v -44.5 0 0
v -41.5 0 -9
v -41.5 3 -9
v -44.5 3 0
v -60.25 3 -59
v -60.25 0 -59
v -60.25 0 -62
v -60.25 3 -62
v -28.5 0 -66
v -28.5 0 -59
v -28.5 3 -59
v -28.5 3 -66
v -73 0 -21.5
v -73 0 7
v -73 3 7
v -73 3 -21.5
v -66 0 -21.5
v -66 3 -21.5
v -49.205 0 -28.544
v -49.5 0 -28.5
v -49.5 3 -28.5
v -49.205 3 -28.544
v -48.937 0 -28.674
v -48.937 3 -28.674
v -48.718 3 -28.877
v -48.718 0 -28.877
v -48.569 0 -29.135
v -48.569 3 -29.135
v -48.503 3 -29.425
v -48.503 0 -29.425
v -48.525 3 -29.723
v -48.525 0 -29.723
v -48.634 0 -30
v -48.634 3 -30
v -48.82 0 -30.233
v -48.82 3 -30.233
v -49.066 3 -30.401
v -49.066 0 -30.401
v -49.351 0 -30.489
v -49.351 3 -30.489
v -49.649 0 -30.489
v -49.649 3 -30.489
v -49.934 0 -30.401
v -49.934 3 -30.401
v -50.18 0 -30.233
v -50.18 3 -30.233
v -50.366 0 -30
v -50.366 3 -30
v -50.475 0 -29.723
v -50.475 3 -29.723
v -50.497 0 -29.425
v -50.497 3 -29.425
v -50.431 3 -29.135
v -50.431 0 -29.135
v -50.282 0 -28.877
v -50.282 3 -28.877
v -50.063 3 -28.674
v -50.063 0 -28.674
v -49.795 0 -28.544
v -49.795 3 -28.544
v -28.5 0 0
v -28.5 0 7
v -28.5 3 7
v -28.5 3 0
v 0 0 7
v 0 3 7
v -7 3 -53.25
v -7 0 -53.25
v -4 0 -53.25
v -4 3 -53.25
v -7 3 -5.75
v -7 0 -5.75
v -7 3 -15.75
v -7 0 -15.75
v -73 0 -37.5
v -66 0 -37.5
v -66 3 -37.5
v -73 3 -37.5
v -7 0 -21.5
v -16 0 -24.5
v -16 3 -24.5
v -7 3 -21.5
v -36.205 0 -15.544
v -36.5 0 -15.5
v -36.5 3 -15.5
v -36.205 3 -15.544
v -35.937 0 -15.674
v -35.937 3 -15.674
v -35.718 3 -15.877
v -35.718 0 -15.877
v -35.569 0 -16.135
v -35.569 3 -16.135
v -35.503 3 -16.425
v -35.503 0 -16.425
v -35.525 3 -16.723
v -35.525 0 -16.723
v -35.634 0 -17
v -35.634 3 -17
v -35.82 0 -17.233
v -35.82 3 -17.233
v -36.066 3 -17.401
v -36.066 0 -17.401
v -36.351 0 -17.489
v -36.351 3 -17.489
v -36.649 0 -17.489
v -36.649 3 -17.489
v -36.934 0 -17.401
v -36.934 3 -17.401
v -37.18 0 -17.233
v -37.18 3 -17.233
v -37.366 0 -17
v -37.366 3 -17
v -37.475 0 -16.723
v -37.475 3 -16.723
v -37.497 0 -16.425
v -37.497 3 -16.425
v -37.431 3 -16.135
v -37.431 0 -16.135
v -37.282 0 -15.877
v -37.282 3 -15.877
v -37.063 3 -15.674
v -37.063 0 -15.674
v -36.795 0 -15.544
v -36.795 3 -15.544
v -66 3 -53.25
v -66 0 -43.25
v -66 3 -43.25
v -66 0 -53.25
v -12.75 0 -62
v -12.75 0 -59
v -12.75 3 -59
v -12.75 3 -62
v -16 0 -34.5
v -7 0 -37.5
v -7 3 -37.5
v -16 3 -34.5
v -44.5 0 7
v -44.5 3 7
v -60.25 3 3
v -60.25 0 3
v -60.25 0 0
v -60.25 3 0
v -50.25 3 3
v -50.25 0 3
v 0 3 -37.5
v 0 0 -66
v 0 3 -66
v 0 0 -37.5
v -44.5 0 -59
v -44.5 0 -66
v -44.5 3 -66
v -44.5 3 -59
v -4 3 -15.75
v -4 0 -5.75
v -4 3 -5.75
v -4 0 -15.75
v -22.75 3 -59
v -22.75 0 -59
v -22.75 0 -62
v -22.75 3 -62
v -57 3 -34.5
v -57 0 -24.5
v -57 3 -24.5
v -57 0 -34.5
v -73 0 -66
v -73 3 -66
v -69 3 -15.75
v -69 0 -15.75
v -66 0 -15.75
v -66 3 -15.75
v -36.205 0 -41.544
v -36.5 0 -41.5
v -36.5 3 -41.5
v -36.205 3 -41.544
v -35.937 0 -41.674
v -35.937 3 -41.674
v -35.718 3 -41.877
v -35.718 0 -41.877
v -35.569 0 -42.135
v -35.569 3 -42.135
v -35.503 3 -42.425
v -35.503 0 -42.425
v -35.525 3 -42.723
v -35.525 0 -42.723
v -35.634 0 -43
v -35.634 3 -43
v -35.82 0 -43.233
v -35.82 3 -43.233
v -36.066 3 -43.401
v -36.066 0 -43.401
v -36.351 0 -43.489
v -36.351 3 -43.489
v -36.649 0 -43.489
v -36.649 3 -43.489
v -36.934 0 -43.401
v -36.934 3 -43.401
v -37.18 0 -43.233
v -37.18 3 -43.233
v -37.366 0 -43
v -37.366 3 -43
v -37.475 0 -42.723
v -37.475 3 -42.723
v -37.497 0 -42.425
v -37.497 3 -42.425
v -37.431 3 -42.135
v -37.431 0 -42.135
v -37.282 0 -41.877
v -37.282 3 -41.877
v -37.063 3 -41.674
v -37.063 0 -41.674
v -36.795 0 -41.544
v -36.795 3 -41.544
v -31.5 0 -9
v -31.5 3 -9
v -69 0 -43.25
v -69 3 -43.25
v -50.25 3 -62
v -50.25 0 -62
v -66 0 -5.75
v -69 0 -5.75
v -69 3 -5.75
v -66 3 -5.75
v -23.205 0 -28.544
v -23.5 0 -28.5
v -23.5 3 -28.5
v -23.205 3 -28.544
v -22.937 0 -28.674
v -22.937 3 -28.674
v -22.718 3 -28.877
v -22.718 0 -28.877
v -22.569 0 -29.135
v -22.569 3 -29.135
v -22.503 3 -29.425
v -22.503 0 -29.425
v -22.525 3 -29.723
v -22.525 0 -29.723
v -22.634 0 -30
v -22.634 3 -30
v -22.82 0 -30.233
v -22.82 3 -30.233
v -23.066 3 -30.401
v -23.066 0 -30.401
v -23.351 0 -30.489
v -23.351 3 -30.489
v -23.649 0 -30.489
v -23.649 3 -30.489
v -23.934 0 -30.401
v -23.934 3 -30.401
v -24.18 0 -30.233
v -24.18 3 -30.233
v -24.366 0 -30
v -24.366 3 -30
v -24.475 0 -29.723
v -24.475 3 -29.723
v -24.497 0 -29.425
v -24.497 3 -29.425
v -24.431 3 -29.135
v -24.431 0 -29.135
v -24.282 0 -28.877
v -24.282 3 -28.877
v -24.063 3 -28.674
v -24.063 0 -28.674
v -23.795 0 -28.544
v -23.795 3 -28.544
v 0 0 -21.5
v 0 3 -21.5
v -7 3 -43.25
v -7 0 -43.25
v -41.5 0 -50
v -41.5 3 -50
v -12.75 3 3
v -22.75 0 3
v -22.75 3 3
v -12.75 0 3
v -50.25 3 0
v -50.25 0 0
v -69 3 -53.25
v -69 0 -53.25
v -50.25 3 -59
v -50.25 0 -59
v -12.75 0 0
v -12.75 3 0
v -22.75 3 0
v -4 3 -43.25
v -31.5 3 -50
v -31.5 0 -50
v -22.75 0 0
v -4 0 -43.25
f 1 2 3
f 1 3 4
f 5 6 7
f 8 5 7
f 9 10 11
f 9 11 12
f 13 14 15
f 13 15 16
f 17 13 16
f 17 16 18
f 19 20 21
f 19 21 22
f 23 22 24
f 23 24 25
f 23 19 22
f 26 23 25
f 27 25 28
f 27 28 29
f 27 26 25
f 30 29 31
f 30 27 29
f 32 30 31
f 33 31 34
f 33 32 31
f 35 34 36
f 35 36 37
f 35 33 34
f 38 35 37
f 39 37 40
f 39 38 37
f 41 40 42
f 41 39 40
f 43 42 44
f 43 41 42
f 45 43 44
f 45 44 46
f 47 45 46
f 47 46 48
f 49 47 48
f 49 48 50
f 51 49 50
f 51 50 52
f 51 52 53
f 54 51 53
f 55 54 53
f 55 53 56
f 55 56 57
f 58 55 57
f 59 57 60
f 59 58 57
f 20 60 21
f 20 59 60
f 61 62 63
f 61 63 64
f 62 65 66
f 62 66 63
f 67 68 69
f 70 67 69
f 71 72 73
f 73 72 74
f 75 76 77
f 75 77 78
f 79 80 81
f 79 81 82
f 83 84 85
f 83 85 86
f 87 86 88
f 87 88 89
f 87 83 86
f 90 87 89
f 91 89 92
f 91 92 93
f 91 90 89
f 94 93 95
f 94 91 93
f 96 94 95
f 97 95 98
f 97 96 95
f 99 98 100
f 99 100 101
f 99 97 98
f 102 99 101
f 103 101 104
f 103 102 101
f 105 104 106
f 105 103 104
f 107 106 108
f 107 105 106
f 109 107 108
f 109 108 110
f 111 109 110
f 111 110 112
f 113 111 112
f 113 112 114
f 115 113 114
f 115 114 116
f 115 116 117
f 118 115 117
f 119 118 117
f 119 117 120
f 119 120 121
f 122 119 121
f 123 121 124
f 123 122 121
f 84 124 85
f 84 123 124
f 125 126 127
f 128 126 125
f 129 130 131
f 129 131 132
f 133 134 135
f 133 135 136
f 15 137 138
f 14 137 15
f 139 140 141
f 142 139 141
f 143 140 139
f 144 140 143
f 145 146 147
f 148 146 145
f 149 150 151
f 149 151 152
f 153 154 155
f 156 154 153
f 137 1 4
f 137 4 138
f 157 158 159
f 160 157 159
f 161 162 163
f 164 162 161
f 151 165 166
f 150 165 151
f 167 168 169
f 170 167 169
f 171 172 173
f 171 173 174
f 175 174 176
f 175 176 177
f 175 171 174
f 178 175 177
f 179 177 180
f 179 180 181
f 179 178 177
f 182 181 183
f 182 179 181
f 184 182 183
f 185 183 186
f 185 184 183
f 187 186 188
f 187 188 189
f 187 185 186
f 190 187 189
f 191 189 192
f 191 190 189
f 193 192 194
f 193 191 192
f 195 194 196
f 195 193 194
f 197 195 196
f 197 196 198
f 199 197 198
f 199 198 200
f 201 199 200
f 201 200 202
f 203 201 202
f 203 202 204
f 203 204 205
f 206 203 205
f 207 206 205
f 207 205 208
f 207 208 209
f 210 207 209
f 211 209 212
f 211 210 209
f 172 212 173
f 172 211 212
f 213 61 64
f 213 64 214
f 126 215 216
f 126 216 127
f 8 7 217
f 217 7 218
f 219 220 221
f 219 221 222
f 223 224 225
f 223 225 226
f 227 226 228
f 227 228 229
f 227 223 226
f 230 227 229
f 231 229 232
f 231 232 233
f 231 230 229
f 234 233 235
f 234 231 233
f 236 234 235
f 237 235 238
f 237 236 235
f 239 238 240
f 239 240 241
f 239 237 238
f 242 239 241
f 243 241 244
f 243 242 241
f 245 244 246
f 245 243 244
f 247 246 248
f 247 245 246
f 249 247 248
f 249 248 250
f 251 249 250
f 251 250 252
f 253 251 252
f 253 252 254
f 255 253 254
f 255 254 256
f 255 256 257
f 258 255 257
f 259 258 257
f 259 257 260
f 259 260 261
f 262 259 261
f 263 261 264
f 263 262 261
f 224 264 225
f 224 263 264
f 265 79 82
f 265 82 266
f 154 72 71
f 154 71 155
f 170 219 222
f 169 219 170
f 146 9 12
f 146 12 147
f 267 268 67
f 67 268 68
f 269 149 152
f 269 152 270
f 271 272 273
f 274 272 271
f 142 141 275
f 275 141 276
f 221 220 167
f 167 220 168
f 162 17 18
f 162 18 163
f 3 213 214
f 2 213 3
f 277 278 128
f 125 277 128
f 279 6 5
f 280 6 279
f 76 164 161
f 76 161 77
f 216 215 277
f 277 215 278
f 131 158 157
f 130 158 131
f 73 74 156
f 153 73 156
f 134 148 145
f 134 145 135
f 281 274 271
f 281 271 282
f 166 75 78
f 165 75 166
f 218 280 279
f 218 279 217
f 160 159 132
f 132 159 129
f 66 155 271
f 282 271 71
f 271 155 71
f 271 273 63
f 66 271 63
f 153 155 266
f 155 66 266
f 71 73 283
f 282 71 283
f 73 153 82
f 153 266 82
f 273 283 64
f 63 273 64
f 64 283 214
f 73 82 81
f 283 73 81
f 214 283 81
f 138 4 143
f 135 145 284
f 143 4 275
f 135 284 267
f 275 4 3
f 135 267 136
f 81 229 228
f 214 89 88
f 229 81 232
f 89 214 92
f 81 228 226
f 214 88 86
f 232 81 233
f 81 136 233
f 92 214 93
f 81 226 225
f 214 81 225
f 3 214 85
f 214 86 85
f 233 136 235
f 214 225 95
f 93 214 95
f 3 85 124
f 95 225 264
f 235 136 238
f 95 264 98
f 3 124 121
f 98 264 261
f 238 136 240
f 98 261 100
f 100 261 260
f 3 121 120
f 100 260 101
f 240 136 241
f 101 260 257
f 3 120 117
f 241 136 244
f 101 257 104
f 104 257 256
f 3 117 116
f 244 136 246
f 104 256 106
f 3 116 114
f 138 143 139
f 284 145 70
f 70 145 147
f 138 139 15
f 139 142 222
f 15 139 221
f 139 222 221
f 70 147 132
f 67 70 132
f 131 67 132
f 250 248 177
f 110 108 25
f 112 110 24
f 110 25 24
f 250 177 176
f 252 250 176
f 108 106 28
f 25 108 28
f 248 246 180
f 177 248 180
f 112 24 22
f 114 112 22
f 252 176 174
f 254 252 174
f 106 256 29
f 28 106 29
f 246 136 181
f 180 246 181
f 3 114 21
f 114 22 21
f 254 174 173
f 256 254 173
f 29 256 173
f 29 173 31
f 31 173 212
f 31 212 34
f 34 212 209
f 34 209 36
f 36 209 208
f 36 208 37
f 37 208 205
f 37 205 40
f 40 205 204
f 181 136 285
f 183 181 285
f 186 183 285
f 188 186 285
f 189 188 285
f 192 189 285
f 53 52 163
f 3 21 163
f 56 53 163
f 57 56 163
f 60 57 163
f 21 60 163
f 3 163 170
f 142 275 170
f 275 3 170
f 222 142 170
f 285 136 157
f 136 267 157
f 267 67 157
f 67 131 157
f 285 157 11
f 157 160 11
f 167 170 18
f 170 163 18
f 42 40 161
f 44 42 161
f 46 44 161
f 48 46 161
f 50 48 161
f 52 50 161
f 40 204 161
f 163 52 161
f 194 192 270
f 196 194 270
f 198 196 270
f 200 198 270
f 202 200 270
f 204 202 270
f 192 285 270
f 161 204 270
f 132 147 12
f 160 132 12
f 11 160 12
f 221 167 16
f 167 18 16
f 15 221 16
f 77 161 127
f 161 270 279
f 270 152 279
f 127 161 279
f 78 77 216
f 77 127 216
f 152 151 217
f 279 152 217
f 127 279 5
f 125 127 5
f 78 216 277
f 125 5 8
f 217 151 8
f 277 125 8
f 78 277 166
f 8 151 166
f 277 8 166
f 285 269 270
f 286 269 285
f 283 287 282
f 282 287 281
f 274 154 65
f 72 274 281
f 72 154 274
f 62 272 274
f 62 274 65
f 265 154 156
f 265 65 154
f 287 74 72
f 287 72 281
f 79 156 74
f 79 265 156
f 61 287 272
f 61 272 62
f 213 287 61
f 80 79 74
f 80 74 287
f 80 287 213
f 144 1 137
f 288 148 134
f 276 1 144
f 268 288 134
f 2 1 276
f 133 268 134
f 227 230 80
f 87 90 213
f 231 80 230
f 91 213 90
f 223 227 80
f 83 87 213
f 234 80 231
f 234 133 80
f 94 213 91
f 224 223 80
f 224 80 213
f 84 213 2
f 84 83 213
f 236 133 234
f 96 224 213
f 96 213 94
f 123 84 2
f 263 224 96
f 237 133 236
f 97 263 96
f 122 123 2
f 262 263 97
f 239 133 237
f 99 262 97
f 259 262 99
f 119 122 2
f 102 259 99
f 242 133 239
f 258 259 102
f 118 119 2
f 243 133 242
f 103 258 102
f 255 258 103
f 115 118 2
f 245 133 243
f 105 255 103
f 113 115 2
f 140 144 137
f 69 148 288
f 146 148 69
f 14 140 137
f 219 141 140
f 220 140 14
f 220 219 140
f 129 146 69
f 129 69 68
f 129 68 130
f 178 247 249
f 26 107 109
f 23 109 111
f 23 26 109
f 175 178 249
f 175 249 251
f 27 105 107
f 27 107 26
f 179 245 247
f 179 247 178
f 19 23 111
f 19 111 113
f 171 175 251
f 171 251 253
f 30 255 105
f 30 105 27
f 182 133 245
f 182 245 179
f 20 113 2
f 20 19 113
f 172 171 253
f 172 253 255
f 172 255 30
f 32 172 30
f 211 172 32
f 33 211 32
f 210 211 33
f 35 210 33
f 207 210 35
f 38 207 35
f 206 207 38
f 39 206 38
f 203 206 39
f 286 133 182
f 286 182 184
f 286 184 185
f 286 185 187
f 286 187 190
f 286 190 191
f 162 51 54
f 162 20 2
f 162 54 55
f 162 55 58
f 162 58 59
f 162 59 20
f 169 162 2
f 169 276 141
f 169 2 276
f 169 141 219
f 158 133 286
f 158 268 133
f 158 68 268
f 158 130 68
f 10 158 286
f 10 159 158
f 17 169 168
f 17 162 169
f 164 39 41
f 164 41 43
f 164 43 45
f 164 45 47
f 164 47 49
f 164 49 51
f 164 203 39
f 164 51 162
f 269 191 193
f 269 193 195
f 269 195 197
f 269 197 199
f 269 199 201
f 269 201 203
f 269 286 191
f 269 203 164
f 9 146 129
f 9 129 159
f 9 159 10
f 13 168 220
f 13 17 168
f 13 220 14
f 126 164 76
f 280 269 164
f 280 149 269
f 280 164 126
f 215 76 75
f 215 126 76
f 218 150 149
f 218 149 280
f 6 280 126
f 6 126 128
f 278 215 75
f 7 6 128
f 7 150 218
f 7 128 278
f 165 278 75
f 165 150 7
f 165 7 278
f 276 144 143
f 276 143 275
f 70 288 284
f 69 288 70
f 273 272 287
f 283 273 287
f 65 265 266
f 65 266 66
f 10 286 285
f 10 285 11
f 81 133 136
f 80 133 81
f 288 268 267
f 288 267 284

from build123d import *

# Parameters (mm, degrees)
SKETCH1_R           = 1
SKETCH1_W           = 3
SKETCH1_H           = 10
SKETCH1_W_2         = 10
SKETCH1_H_2         = 3
BOSS_EXTRUDE1_DEPTH = 3


with BuildPart() as part:
    # Sketch1 → Boss-Extrude1 (new body)
    with BuildSketch(Plane(origin=(0, 0, 0), x_dir=(1, 0, 0), z_dir=(0, 1, 0))):
        Polygon((-31.5, 9), (-41.5, 9), (-44.5, 0), (-44.5, -7), (-73, -7), (-73, 21.5), (-66, 21.5), (-57, 24.5), (-57, 34.5), (-66, 37.5), (-73, 37.5), (-73, 66), (-44.5, 66), (-44.5, 59), (-41.5, 50), (-31.5, 50), (-28.5, 59), (-28.5, 66), (0, 66), (0, 37.5), (-7, 37.5), (-16, 34.5), (-16, 24.5), (-7, 21.5), (0, 21.5), (0, -7), (-28.5, -7), (-28.5, 0), align=None)
        with Locations(Location((-36.5, 42.5, 0), (0, 0, 270))):
            Circle(SKETCH1_R, mode=Mode.SUBTRACT)
        with Locations(Location((-23.5, 29.5, 0), (0, 0, 270))):
            Circle(SKETCH1_R, mode=Mode.SUBTRACT)
        with Locations(Location((-36.5, 16.5, 0), (0, 0, 270))):
            Circle(SKETCH1_R, mode=Mode.SUBTRACT)
        with Locations(Location((-49.5, 29.5, 0), (0, 0, 270))):
            Circle(SKETCH1_R, mode=Mode.SUBTRACT)
        with Locations((-5.5, 48.25)):
            Rectangle(SKETCH1_W, SKETCH1_H, mode=Mode.SUBTRACT)
        with Locations((-5.5, 10.75)):
            Rectangle(SKETCH1_W, SKETCH1_H, mode=Mode.SUBTRACT)
        with Locations((-67.5, 10.75)):
            Rectangle(SKETCH1_W, SKETCH1_H, mode=Mode.SUBTRACT)
        with Locations((-67.5, 48.25)):
            Rectangle(SKETCH1_W, SKETCH1_H, mode=Mode.SUBTRACT)
        with Locations((-55.25, -1.5)):
            Rectangle(SKETCH1_W_2, SKETCH1_H_2, mode=Mode.SUBTRACT)
        with Locations((-17.75, -1.5)):
            Rectangle(SKETCH1_W_2, SKETCH1_H_2, mode=Mode.SUBTRACT)
        with Locations((-17.75, 60.5)):
            Rectangle(SKETCH1_W_2, SKETCH1_H_2, mode=Mode.SUBTRACT)
        with Locations((-55.25, 60.5)):
            Rectangle(SKETCH1_W_2, SKETCH1_H_2, mode=Mode.SUBTRACT)
    extrude(amount=BOSS_EXTRUDE1_DEPTH)


solid = part.part
